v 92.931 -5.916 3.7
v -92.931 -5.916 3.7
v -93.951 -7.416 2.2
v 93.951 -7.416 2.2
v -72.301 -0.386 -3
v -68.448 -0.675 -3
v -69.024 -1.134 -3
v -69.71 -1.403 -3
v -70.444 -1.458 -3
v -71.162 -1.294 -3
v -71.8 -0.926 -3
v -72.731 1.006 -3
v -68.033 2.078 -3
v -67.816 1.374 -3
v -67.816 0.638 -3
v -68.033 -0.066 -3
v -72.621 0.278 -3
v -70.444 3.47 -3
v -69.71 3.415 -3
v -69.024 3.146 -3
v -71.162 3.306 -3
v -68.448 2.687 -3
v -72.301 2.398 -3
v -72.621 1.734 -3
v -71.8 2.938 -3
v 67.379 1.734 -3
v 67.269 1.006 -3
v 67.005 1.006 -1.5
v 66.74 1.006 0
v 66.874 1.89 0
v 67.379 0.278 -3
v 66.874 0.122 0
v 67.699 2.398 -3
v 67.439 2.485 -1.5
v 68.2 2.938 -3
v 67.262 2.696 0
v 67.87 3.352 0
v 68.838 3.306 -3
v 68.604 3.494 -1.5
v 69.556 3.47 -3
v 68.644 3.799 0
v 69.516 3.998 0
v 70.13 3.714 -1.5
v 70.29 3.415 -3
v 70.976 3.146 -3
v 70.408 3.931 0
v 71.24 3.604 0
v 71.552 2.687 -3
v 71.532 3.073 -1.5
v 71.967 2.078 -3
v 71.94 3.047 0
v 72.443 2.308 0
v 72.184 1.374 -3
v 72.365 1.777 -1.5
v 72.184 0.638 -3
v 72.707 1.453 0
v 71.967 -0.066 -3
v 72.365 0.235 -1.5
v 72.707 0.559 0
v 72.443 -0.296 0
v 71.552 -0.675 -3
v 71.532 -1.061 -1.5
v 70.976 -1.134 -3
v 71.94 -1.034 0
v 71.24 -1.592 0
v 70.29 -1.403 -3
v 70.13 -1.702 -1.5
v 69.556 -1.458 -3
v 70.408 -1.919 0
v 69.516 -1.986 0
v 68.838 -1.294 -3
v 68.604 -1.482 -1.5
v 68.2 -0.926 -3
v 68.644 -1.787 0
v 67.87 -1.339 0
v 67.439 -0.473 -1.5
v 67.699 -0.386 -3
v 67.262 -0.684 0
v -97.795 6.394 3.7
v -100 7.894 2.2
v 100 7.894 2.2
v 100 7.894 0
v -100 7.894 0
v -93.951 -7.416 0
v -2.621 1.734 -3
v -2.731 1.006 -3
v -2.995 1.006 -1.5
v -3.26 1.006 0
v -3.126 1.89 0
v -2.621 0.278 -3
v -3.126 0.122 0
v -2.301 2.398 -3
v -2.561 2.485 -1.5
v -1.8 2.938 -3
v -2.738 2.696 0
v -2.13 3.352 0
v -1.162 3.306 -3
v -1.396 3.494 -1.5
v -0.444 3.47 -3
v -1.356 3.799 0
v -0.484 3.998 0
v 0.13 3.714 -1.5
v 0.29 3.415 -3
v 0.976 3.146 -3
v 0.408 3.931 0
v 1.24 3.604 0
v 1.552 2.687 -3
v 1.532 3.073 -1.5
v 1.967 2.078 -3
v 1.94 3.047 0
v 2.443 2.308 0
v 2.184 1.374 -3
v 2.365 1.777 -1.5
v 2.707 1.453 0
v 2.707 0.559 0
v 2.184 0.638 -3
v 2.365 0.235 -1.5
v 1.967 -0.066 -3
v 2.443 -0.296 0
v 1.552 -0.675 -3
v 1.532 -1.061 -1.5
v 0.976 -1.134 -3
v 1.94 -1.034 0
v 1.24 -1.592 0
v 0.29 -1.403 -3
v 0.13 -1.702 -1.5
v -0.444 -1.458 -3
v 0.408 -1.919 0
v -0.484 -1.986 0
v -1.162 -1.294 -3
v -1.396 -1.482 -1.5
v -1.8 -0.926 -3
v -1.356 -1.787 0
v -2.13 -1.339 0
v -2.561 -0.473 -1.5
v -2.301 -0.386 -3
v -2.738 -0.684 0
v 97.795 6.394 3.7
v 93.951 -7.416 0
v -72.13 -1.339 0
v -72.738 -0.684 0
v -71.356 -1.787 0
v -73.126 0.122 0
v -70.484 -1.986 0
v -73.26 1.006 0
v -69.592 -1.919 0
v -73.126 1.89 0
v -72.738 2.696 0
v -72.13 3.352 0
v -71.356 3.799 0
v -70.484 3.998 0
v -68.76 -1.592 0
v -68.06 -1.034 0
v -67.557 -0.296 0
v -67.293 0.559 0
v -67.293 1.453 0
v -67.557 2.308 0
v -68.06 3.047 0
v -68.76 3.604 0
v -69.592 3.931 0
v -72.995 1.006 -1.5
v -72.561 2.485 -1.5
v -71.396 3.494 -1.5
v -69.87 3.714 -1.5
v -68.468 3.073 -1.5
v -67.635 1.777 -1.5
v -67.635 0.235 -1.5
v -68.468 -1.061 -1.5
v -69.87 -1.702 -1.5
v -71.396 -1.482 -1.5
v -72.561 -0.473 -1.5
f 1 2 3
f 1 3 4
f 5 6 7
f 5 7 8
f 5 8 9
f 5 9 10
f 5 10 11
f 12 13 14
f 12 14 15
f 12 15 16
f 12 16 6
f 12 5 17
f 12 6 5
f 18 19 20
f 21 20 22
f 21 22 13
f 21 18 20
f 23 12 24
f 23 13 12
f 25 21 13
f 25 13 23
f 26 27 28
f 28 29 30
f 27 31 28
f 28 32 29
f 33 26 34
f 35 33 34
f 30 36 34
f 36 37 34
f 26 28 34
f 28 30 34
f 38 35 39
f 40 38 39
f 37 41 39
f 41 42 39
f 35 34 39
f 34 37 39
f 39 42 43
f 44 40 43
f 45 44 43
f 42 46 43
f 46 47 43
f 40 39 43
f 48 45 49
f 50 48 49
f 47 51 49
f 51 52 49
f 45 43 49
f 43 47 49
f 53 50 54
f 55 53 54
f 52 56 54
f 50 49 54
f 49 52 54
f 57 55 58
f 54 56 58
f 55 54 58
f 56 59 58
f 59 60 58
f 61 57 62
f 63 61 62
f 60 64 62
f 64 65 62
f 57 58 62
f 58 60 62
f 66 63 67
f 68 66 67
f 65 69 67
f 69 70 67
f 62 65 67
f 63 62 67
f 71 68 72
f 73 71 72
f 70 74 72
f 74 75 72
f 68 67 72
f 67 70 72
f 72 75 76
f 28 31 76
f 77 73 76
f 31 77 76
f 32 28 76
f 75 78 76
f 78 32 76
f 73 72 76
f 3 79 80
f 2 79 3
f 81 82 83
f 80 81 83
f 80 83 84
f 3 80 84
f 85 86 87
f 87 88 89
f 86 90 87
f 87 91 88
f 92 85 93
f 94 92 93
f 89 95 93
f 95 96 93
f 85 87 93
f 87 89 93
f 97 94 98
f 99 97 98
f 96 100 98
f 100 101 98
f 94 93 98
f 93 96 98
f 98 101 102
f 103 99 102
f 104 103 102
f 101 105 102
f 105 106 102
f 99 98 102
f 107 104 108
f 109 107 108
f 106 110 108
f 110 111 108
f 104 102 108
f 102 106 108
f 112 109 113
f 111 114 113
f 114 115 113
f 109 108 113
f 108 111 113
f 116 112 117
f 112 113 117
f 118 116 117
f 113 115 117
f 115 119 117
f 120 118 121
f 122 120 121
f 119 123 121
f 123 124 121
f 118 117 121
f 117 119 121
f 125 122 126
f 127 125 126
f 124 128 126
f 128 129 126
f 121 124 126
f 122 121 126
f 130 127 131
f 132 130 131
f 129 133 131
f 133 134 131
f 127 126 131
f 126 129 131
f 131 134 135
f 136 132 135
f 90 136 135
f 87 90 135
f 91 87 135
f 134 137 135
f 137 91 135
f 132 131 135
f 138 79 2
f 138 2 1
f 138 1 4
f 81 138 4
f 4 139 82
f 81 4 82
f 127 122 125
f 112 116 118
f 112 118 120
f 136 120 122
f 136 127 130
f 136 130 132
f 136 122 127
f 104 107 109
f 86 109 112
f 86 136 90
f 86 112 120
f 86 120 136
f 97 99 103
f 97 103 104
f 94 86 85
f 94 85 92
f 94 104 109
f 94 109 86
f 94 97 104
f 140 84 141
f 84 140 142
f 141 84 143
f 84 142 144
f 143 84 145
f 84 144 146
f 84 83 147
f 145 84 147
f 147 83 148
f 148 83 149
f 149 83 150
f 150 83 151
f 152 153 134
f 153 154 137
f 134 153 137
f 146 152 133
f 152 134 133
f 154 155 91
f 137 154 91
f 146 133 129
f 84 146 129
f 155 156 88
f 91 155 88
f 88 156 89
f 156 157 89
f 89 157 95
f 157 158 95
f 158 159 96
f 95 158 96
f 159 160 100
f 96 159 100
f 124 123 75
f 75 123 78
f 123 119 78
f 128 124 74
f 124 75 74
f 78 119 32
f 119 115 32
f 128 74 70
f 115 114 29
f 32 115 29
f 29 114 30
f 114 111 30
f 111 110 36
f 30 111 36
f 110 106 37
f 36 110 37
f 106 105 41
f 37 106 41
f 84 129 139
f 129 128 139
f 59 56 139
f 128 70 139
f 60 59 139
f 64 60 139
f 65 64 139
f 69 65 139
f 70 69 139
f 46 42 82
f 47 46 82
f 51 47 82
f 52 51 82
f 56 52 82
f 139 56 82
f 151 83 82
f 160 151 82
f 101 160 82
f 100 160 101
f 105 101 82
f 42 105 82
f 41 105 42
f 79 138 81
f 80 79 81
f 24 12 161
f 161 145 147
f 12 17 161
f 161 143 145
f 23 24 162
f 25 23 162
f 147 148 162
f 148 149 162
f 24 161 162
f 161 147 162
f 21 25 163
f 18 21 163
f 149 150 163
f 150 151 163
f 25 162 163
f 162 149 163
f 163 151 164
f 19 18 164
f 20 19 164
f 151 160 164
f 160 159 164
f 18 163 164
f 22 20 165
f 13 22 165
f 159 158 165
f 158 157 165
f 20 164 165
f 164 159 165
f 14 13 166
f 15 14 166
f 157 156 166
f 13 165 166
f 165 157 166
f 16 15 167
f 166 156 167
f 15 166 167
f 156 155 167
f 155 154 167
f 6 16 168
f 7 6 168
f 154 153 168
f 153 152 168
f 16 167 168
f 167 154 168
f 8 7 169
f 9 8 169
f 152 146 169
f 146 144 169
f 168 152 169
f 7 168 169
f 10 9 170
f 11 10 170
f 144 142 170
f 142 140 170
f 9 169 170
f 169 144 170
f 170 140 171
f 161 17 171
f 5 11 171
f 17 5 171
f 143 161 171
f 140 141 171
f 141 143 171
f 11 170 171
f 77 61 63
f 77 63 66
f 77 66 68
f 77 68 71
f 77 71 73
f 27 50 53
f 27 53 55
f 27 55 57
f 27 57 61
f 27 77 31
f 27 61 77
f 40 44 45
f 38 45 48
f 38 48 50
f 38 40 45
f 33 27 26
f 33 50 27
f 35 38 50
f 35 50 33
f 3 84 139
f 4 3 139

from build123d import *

# Parameters (mm, degrees)
BOSS_EXTRUDE1_DEPTH           = 3.7
CHAMFER1_SIZE                 = 1.5
SKETCH2_R                     = 3
BOSS_EXTRUDE2_DEPTH           = 3
BOSS_EXTRUDE2_DRAFT           = 10
BOSS_EXTRUDE2_PROFILE_2_DEPTH = 3
BOSS_EXTRUDE2_PROFILE_2_DRAFT = 10
BOSS_EXTRUDE2_PROFILE_3_DEPTH = 3
BOSS_EXTRUDE2_PROFILE_3_DRAFT = 10


with BuildPart() as part:
    # Sketch1 → Boss-Extrude1 (new body)
    with BuildSketch(Plane.XY):
        Polygon((100, 7.893729842), (-100, 7.893729842), (-93.951405808, -7.416270158), (93.951405808, -7.416270158), align=None)
    extrude(amount=BOSS_EXTRUDE1_DEPTH)

    # Chamfer1
    chamfer1_edges = [part.edges().sort_by_distance(p)[0] for p in [
        (0, 7.893729842, 3.7),
        (-96.975702904, 0.238729842, 3.7),
        (0, -7.416270158, 3.7),
        (96.975702904, 0.238729842, 3.7),
    ]]
    chamfer(chamfer1_edges, length=CHAMFER1_SIZE)


with BuildPart() as boss_extrude2_tool:
    # Sketch2 → Boss-Extrude2 (with draft: the straight prism first)
    with BuildSketch(Plane(origin=(0, 0, 0), x_dir=(-1, 0, 0), z_dir=(0, 0, -1))):
        with Locations((-69.740425787, 1.006073404)):
            Circle(SKETCH2_R)
    extrude(amount=BOSS_EXTRUDE2_DEPTH)
    # Boss-Extrude2: the draft: its side faces are tilted about the plane it starts from
    boss_extrude2_sides = [boss_extrude2_tool.faces().sort_by_distance(p)[0] for p in [
        (72.740425787, 1.006073404, -1.5),
    ]]
    draft(boss_extrude2_sides, Plane(origin=(0, 0, 0), x_dir=(-1, 0, 0), z_dir=(0, 0, -1)), BOSS_EXTRUDE2_DRAFT)


with BuildPart() as part_1:
    add(part.part)

    # Boss-Extrude2: add boss_extrude2_tool
    add(boss_extrude2_tool.part)


with BuildPart() as boss_extrude2_profile_2_tool:
    # Sketch2 → Boss-Extrude2 profile 2 (with draft: the straight prism first)
    with BuildSketch(Plane(origin=(0, 0, 0), x_dir=(-1, 0, 0), z_dir=(0, 0, -1))):
        with Locations((0.259574213, 1.006073404)):
            Circle(SKETCH2_R)
    extrude(amount=BOSS_EXTRUDE2_PROFILE_2_DEPTH)
    # Boss-Extrude2 profile 2: the draft: its side faces are tilted about the plane it starts from
    boss_extrude2_profile_2_sides = [boss_extrude2_profile_2_tool.faces().sort_by_distance(p)[0] for p in [
        (2.740425787, 1.006073404, -1.5),
    ]]
    draft(boss_extrude2_profile_2_sides, Plane(origin=(0, 0, 0), x_dir=(-1, 0, 0), z_dir=(0, 0, -1)), BOSS_EXTRUDE2_PROFILE_2_DRAFT)


with BuildPart() as part_2:
    add(part_1.part)

    # Boss-Extrude2 profile 2: add boss_extrude2_profile_2_tool
    add(boss_extrude2_profile_2_tool.part)


with BuildPart() as boss_extrude2_profile_3_tool:
    # Sketch2 → Boss-Extrude2 profile 3 (with draft: the straight prism first)
    with BuildSketch(Plane(origin=(0, 0, 0), x_dir=(-1, 0, 0), z_dir=(0, 0, -1))):
        with Locations((70.259574213, 1.006073404)):
            Circle(SKETCH2_R)
    extrude(amount=BOSS_EXTRUDE2_PROFILE_3_DEPTH)
    # Boss-Extrude2 profile 3: the draft: its side faces are tilted about the plane it starts from
    boss_extrude2_profile_3_sides = [boss_extrude2_profile_3_tool.faces().sort_by_distance(p)[0] for p in [
        (-67.259574213, 1.006073404, -1.5),
    ]]
    draft(boss_extrude2_profile_3_sides, Plane(origin=(0, 0, 0), x_dir=(-1, 0, 0), z_dir=(0, 0, -1)), BOSS_EXTRUDE2_PROFILE_3_DRAFT)


with BuildPart() as part_3:
    add(part_2.part)

    # Boss-Extrude2 profile 3: add boss_extrude2_profile_3_tool
    add(boss_extrude2_profile_3_tool.part)


solid = part_3.part
